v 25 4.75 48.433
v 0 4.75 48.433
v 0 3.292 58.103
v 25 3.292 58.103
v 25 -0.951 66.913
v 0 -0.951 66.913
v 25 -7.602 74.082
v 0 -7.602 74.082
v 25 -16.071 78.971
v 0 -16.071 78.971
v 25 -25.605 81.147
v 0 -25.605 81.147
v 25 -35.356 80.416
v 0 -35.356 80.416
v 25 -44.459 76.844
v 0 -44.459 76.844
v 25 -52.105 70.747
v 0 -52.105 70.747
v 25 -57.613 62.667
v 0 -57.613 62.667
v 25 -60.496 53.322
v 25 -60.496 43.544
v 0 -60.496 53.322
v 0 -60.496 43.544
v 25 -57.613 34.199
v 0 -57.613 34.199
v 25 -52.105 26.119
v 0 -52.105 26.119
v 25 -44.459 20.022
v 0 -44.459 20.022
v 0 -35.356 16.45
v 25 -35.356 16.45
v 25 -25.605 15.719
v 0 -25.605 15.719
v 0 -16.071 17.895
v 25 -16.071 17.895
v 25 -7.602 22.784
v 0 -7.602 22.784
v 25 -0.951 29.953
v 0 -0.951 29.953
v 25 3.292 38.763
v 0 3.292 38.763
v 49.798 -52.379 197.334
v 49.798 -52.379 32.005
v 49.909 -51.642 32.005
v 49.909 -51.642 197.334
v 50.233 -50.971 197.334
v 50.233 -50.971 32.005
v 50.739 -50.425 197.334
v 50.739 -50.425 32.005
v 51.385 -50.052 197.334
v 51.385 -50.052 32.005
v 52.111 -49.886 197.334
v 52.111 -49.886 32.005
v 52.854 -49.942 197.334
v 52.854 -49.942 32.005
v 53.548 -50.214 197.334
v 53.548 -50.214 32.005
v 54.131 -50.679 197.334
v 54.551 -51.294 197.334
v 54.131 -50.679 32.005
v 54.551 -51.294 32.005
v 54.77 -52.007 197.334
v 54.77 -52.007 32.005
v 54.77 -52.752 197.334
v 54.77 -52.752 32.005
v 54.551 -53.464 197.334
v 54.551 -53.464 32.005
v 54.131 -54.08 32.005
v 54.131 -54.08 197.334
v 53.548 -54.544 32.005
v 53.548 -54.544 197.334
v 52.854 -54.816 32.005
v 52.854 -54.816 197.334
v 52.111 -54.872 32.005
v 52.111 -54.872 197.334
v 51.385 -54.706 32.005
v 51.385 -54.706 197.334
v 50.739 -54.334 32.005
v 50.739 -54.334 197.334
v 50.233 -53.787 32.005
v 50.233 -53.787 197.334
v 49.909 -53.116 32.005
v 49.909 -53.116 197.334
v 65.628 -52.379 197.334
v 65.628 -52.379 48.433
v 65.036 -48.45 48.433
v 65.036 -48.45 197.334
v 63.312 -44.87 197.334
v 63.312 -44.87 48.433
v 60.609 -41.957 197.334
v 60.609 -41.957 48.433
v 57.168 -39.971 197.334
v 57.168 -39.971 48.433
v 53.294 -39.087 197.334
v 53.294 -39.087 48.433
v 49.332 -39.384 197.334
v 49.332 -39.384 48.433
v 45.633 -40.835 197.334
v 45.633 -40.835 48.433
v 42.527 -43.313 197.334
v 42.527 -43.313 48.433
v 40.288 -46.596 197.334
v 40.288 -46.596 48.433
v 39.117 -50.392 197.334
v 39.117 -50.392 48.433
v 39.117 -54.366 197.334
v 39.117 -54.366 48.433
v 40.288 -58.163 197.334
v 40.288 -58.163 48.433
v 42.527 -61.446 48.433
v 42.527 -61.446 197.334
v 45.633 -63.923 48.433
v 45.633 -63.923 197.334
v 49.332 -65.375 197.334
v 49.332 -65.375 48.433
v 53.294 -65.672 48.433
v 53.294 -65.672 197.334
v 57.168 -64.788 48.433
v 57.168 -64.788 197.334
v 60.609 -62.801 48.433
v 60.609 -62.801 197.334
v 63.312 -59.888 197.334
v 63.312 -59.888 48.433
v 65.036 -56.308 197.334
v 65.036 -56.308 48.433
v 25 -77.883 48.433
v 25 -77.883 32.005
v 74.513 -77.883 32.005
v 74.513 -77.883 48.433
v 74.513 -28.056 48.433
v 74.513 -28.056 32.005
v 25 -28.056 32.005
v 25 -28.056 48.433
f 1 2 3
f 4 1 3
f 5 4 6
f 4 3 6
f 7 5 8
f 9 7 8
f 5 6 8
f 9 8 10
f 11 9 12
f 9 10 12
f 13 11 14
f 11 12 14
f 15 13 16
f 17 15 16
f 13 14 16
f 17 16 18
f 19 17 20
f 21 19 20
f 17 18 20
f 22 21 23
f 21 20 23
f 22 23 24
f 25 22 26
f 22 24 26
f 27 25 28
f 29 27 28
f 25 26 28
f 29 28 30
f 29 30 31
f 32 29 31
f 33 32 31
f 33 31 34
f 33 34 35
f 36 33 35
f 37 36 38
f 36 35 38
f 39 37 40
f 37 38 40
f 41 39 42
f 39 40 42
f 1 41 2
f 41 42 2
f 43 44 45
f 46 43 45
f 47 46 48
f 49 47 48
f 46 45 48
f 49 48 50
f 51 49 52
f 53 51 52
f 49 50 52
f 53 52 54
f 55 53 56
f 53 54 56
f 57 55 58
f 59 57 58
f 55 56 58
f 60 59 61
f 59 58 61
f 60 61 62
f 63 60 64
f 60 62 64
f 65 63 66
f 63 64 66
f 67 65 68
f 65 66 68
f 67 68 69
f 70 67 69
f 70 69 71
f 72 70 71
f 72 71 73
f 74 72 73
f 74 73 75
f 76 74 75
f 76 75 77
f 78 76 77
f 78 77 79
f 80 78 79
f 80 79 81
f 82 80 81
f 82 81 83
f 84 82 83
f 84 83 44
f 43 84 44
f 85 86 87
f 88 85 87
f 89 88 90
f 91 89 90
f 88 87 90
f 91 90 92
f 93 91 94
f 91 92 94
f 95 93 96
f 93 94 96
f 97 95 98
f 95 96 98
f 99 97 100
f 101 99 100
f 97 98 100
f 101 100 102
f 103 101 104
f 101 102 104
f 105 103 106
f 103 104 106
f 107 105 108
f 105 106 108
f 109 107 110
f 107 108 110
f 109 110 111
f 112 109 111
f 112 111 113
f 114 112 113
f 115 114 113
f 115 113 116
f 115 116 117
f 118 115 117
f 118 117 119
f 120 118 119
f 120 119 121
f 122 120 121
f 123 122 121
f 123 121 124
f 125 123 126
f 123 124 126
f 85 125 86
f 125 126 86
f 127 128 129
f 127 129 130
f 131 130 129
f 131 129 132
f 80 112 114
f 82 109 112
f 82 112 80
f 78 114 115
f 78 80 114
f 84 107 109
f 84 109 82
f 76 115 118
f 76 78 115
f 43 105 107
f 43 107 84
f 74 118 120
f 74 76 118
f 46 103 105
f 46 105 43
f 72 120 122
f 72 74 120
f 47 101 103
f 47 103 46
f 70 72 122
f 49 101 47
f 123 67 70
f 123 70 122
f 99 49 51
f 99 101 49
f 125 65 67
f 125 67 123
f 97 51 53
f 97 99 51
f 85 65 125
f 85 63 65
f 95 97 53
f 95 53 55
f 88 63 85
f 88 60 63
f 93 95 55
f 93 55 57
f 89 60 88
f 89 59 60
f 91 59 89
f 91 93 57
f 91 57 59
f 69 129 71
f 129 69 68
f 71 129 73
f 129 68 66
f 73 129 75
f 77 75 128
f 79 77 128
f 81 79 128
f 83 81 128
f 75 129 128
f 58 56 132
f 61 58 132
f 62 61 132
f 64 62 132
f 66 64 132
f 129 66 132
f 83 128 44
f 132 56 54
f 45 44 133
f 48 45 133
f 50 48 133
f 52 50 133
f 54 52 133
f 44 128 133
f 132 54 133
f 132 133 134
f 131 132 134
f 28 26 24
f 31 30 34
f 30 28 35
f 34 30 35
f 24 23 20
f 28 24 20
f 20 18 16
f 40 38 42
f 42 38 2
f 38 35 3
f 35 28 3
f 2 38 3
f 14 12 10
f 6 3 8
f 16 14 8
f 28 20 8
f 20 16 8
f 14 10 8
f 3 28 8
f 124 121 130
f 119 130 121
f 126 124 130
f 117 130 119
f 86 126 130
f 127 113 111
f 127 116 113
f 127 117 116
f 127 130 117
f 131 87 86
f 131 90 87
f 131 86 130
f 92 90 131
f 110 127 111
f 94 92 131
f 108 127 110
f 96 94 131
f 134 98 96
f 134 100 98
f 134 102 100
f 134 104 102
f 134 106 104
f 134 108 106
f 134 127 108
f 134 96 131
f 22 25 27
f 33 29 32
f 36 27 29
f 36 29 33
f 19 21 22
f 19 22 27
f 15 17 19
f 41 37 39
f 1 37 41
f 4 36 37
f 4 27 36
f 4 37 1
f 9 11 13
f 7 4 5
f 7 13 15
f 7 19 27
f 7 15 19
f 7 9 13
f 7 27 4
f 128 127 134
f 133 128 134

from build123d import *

# Parameters (mm, degrees)
F0_R     = 32.8057218661
F1_DEPTH = 25
F2_W     = 49.826644361
F2_H     = 16.4276733994
F3_DEPTH = 49.5127849281
F7_R     = 13.3298307558
F4_DEPTH = 148.9010583609
F8_D     = 5


# Not quite as in the source:
# - the program builds the solid bodies; features that only make, move or delete a surface that nothing else refers to are left out


with BuildPart() as f1:
    # F0 (on Right) → F1 (new body)
    with BuildSketch(Plane.YZ):
        with Locations((-28.0562192202, 48.4330356121)):
            Circle(F0_R)
    extrude(amount=F1_DEPTH)


with BuildPart() as f3:
    # F2 (on face) → F3 (new body)
    with BuildSketch(Plane.YZ.offset(25)):
        with Locations((-52.9695414007, 40.2191989124)):
            Rectangle(F2_W, F2_H)
    extrude(amount=F3_DEPTH)

    # F7 (on face) → F4 (join)
    with BuildSketch(Plane.XY.offset(48.4330356121)):
        with Locations((52.2981211543, -52.3791536689)):
            Circle(F7_R)
    extrude(amount=F4_DEPTH)

    # F8 (through all)
    with Locations(Plane.XY.offset(197.334093973)):
        with Locations((52.2981211543, -52.3791536689)):
            Hole(F8_D / 2)


solid = Compound([f1.part, f3.part])
